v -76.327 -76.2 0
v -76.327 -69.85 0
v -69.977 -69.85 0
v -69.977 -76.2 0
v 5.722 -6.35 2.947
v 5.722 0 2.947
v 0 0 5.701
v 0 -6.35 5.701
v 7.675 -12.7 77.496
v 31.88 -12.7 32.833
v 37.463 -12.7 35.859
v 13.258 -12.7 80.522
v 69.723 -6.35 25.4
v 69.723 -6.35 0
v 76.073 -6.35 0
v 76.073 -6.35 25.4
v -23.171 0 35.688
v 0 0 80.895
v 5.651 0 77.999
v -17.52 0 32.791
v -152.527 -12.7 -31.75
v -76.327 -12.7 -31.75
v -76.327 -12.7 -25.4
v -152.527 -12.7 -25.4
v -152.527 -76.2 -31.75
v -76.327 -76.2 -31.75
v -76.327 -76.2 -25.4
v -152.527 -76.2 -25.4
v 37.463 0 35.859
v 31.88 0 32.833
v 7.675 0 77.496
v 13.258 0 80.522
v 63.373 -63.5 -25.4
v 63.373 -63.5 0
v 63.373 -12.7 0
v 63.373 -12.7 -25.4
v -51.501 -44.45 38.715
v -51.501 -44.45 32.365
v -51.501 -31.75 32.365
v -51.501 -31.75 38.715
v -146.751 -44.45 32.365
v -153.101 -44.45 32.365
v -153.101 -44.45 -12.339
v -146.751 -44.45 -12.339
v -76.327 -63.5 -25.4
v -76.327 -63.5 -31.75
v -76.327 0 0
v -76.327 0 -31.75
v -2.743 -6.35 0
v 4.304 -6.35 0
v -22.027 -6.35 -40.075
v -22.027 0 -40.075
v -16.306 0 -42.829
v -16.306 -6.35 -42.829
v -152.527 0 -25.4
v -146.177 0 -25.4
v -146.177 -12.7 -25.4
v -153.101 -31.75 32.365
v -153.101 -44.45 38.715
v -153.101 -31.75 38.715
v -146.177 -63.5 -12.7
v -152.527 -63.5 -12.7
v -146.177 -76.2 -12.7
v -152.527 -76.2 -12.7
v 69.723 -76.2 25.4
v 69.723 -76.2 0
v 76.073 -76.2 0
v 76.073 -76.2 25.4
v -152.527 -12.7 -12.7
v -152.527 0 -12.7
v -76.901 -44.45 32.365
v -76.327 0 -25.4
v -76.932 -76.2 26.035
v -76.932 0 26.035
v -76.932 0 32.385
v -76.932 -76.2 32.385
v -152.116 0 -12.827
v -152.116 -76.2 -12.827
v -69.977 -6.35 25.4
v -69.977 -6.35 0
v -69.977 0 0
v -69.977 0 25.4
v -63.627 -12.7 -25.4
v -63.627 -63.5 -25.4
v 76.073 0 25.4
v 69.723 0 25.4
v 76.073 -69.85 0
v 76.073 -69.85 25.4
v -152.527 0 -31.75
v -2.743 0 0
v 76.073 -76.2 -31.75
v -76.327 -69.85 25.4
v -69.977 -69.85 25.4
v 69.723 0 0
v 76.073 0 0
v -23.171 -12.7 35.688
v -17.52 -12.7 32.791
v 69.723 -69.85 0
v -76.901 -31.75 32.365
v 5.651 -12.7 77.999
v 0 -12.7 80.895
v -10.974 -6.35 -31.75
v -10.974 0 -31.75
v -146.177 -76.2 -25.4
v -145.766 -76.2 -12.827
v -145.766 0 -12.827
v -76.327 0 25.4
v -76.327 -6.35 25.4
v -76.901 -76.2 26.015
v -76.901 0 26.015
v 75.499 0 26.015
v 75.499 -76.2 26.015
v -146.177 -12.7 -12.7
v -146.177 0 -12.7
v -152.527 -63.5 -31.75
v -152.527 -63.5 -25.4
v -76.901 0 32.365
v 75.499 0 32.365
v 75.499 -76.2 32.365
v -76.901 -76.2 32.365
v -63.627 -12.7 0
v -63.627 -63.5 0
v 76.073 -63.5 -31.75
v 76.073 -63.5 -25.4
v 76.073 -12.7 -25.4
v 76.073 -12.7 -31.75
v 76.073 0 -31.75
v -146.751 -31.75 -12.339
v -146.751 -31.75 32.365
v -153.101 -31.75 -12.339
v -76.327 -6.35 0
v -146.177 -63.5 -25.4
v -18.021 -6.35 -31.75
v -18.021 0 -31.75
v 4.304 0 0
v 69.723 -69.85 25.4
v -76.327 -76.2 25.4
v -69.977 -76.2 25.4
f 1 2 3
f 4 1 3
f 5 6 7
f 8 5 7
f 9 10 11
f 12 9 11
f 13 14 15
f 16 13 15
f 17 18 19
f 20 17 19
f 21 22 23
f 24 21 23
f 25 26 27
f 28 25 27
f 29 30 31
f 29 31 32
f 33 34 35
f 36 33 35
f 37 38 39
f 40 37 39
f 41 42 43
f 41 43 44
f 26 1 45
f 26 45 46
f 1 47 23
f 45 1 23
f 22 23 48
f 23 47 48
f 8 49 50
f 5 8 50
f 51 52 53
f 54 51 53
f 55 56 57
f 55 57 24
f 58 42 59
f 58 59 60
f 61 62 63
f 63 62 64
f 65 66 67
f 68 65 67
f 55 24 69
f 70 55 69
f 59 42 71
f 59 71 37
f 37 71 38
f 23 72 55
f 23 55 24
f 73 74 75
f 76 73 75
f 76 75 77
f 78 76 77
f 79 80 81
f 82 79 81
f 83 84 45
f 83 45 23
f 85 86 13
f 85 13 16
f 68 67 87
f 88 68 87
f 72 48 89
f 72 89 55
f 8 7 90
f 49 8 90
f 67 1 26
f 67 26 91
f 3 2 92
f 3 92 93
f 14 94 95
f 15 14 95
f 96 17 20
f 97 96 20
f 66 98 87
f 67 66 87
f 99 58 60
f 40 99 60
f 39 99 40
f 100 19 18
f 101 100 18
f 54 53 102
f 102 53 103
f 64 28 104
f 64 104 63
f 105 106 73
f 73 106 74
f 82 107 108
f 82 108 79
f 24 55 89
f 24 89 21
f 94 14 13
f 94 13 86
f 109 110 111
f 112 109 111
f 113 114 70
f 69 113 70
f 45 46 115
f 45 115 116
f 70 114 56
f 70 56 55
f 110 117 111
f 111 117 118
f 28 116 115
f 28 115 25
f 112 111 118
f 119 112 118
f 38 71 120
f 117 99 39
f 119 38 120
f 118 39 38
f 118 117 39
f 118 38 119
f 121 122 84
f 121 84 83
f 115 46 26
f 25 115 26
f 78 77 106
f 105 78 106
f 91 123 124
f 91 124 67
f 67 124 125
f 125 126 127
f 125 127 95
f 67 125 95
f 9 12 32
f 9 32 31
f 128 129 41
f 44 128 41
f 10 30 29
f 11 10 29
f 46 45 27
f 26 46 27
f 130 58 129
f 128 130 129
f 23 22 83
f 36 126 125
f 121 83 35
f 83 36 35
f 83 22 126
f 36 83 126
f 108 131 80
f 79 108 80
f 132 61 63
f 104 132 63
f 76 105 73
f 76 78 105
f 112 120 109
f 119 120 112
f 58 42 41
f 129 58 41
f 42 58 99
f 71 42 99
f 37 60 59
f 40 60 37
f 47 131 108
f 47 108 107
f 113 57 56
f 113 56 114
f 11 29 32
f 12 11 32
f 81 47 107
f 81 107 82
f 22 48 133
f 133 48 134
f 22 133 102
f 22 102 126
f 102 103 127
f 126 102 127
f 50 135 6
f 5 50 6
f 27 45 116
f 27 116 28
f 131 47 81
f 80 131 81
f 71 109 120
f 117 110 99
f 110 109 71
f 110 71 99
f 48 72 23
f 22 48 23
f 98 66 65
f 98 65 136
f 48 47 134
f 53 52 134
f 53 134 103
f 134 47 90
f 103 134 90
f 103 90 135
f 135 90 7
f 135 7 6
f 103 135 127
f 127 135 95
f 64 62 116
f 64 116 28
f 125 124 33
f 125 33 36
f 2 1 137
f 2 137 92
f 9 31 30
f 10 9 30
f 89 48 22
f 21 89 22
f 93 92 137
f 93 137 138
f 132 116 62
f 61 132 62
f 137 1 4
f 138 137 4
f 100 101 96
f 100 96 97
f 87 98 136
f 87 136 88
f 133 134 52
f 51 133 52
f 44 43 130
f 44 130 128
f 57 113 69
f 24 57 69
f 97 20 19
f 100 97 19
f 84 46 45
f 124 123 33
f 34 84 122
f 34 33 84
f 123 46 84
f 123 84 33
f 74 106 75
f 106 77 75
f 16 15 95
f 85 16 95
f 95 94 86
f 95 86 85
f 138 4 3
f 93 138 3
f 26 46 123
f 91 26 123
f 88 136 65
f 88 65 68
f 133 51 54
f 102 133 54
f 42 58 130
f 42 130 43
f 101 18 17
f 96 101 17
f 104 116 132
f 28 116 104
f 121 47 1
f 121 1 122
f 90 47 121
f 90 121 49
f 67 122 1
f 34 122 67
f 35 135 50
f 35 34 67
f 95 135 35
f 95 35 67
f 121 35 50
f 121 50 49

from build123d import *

# Parameters (mm, degrees)
F0_W      = 152.4
F0_H      = 25.4
F0_H_2    = 6.35
F1_DEPTH  = 76.2
F2_W      = 50.8
F2_H      = 6.35
F3_DEPTH  = 175.006
F4_W      = 127
F4_H      = 50.8
F5_DEPTH  = 43.688
F6_W      = 6.35
F6_H      = 6.35
F7_DEPTH  = 25.4
F8_DEPTH  = 25.4
F9_DEPTH  = 25.4
F10_DEPTH = 25.4
F11_W     = 152.4
F11_H     = 6.35
F12_DEPTH = 76.2
F13_W     = 101.6
F13_H     = 12.7
F14_DEPTH = 6.35
F15_W     = 12.7
F15_H     = 6.35
F16_DEPTH = 76.2
F17_W     = 12.7
F17_H     = 6.35
F19_DEPTH = 76.2
F20_W     = 6.35
F20_H     = 12.7
F21_DEPTH = 12.7
F22_W     = 12.7
F22_H     = 12.7
F23_DEPTH = 6.35
F25_DEPTH = 76.2
F26_W     = 6.35
F26_H     = 12.7
F27_DEPTH = 44.704
F29_DEPTH = 12.7
F31_DEPTH = 12.7
F33_DEPTH = 6.35


with BuildPart() as f1:
    # F0 (on Front) → F1 (new body)
    with BuildSketch(Plane.XZ):
        with Locations((-0.1274236178, -12.7)):
            Rectangle(F0_W, F0_H)
        with Locations((-0.1274236178, -28.575)):
            Rectangle(F0_W, F0_H_2)
    extrude(amount=F1_DEPTH)

    # F2 (on face) → F3 (cut)
    with BuildSketch(Plane.YZ.offset(76.0725763822)):
        with Locations((-38.1, -28.575)):
            Rectangle(F2_W, F2_H)
    extrude(amount=-F3_DEPTH, mode=Mode.SUBTRACT)

    # F4 (on face) → F5 (cut)
    with BuildSketch(Plane.XY):
        with Locations((-0.1274236178, -38.1)):
            Rectangle(F4_W, F4_H)
    extrude(amount=-F5_DEPTH, mode=Mode.SUBTRACT)

    # F32 (on Front) → F33 (join)
    with BuildSketch(Plane.XZ):
        Polygon((0, 5.7005062699), (-22.0274893392, -40.0753576041), (-16.305506355, -42.8287937715), (5.7219829842, 2.9470701025), align=None)
    extrude(amount=F33_DEPTH)


with BuildPart() as f7:
    # F6 (on face) → F7 (new body)
    with BuildSketch(Plane.XY):
        with Locations((-73.1524236178, -3.175)):
            Rectangle(F6_W, F6_H)
    extrude(amount=F7_DEPTH)


with BuildPart() as f8:
    # F6 (on face) → F8 (new body)
    with BuildSketch(Plane.XY):
        with Locations((-73.1524236178, -73.025)):
            Rectangle(F6_W, F6_H)
    extrude(amount=F8_DEPTH)


with BuildPart() as f9:
    # F6 (on face) → F9 (new body)
    with BuildSketch(Plane.XY):
        with Locations((72.8975763822, -3.175)):
            Rectangle(F6_W, F6_H)
    extrude(amount=F9_DEPTH)


with BuildPart() as f10:
    # F6 (on face) → F10 (new body)
    with BuildSketch(Plane.XY):
        with Locations((72.8975763822, -73.025)):
            Rectangle(F6_W, F6_H)
    extrude(amount=F10_DEPTH)


with BuildPart() as f12:
    # F11 (on Front) → F12 (new body)
    with BuildSketch(Plane.XZ):
        with Locations((-0.7012687636, 29.1903975472)):
            Rectangle(F11_W, F11_H)
    extrude(amount=F12_DEPTH)

    # F13 (on face) → F14 (join)
    with BuildSketch(Plane.XY.offset(32.3653975472)):
        with Locations((-102.3012687636, -38.1)):
            Rectangle(F13_W, F13_H)
    extrude(amount=F14_DEPTH)


with BuildPart() as f16:
    # F15 (on face) → F16 (new body)
    with BuildSketch(Plane(origin=(-76.3274236178, 0, 0), x_dir=(0, -1, 0), z_dir=(-1, 0, 0))):
        with Locations((6.35, -28.575)):
            Rectangle(F15_W, F15_H)
    extrude(amount=F16_DEPTH)


with BuildPart() as f19:
    # F17 (on face) → F19 (new body)
    with BuildSketch(Plane(origin=(-76.3274236178, 0, 0), x_dir=(0, -1, 0), z_dir=(-1, 0, 0))):
        with Locations((69.85, -28.575)):
            Rectangle(F17_W, F17_H)
    extrude(amount=F19_DEPTH)


with BuildPart() as f21:
    # F20 (on face) → F21 (new body)
    with BuildSketch(Plane(origin=(0, 0, 0), x_dir=(-1, 0, 0), z_dir=(0, 1, 0))):
        with Locations((149.3524236178, -19.05)):
            Rectangle(F20_W, F20_H)
    extrude(amount=-F21_DEPTH)


with BuildPart() as f23:
    # F22 (on face) → F23 (new body)
    with BuildSketch(Plane(origin=(-152.5274236178, 0, 0), x_dir=(0, -1, 0), z_dir=(-1, 0, 0))):
        with Locations((69.85, -19.05)):
            Rectangle(F22_W, F22_H)
    extrude(amount=-F23_DEPTH)


with BuildPart() as f25:
    # F24 (on Front) → F25 (new body)
    with BuildSketch(Plane.XZ):
        Polygon((-152.1156430244, -12.8270005807), (-145.7656430244, -12.8270005807), (-76.9316330552, 26.0349990964), (-76.9316330552, 32.3849990964), align=None)
    extrude(amount=F25_DEPTH)


with BuildPart() as f27:
    # F26 (on face) → F27 (new body)
    with BuildSketch(Plane(origin=(0, 0, 32.3653975472), x_dir=(1, 0, 0), z_dir=(0, 0, -1))):
        with Locations((-149.9262687636, 38.1)):
            Rectangle(F26_W, F26_H)
    extrude(amount=F27_DEPTH)


with BuildPart() as f29:
    # F28 (on Front) → F29 (new body)
    with BuildSketch(Plane.XZ):
        Polygon((0, 80.8953270316), (-23.1713982343, 35.6877358122), (-17.5204493319, 32.7913110329), (5.6509489024, 77.9989022523), align=None)
    extrude(amount=F29_DEPTH)


with BuildPart() as f31:
    # F30 (on Front) → F31 (new body)
    with BuildSketch(Plane.XZ):
        Polygon((37.4627455747, 35.8587955256), (13.2582784958, 80.5217978142), (7.6754032098, 77.4962394293), (31.8798702887, 32.8332371408), align=None)
    extrude(amount=F31_DEPTH)


solid = Compound([f1.part, f7.part, f8.part, f9.part, f10.part, f12.part, f16.part, f19.part, f21.part, f23.part, f25.part, f27.part, f29.part, f31.part])
